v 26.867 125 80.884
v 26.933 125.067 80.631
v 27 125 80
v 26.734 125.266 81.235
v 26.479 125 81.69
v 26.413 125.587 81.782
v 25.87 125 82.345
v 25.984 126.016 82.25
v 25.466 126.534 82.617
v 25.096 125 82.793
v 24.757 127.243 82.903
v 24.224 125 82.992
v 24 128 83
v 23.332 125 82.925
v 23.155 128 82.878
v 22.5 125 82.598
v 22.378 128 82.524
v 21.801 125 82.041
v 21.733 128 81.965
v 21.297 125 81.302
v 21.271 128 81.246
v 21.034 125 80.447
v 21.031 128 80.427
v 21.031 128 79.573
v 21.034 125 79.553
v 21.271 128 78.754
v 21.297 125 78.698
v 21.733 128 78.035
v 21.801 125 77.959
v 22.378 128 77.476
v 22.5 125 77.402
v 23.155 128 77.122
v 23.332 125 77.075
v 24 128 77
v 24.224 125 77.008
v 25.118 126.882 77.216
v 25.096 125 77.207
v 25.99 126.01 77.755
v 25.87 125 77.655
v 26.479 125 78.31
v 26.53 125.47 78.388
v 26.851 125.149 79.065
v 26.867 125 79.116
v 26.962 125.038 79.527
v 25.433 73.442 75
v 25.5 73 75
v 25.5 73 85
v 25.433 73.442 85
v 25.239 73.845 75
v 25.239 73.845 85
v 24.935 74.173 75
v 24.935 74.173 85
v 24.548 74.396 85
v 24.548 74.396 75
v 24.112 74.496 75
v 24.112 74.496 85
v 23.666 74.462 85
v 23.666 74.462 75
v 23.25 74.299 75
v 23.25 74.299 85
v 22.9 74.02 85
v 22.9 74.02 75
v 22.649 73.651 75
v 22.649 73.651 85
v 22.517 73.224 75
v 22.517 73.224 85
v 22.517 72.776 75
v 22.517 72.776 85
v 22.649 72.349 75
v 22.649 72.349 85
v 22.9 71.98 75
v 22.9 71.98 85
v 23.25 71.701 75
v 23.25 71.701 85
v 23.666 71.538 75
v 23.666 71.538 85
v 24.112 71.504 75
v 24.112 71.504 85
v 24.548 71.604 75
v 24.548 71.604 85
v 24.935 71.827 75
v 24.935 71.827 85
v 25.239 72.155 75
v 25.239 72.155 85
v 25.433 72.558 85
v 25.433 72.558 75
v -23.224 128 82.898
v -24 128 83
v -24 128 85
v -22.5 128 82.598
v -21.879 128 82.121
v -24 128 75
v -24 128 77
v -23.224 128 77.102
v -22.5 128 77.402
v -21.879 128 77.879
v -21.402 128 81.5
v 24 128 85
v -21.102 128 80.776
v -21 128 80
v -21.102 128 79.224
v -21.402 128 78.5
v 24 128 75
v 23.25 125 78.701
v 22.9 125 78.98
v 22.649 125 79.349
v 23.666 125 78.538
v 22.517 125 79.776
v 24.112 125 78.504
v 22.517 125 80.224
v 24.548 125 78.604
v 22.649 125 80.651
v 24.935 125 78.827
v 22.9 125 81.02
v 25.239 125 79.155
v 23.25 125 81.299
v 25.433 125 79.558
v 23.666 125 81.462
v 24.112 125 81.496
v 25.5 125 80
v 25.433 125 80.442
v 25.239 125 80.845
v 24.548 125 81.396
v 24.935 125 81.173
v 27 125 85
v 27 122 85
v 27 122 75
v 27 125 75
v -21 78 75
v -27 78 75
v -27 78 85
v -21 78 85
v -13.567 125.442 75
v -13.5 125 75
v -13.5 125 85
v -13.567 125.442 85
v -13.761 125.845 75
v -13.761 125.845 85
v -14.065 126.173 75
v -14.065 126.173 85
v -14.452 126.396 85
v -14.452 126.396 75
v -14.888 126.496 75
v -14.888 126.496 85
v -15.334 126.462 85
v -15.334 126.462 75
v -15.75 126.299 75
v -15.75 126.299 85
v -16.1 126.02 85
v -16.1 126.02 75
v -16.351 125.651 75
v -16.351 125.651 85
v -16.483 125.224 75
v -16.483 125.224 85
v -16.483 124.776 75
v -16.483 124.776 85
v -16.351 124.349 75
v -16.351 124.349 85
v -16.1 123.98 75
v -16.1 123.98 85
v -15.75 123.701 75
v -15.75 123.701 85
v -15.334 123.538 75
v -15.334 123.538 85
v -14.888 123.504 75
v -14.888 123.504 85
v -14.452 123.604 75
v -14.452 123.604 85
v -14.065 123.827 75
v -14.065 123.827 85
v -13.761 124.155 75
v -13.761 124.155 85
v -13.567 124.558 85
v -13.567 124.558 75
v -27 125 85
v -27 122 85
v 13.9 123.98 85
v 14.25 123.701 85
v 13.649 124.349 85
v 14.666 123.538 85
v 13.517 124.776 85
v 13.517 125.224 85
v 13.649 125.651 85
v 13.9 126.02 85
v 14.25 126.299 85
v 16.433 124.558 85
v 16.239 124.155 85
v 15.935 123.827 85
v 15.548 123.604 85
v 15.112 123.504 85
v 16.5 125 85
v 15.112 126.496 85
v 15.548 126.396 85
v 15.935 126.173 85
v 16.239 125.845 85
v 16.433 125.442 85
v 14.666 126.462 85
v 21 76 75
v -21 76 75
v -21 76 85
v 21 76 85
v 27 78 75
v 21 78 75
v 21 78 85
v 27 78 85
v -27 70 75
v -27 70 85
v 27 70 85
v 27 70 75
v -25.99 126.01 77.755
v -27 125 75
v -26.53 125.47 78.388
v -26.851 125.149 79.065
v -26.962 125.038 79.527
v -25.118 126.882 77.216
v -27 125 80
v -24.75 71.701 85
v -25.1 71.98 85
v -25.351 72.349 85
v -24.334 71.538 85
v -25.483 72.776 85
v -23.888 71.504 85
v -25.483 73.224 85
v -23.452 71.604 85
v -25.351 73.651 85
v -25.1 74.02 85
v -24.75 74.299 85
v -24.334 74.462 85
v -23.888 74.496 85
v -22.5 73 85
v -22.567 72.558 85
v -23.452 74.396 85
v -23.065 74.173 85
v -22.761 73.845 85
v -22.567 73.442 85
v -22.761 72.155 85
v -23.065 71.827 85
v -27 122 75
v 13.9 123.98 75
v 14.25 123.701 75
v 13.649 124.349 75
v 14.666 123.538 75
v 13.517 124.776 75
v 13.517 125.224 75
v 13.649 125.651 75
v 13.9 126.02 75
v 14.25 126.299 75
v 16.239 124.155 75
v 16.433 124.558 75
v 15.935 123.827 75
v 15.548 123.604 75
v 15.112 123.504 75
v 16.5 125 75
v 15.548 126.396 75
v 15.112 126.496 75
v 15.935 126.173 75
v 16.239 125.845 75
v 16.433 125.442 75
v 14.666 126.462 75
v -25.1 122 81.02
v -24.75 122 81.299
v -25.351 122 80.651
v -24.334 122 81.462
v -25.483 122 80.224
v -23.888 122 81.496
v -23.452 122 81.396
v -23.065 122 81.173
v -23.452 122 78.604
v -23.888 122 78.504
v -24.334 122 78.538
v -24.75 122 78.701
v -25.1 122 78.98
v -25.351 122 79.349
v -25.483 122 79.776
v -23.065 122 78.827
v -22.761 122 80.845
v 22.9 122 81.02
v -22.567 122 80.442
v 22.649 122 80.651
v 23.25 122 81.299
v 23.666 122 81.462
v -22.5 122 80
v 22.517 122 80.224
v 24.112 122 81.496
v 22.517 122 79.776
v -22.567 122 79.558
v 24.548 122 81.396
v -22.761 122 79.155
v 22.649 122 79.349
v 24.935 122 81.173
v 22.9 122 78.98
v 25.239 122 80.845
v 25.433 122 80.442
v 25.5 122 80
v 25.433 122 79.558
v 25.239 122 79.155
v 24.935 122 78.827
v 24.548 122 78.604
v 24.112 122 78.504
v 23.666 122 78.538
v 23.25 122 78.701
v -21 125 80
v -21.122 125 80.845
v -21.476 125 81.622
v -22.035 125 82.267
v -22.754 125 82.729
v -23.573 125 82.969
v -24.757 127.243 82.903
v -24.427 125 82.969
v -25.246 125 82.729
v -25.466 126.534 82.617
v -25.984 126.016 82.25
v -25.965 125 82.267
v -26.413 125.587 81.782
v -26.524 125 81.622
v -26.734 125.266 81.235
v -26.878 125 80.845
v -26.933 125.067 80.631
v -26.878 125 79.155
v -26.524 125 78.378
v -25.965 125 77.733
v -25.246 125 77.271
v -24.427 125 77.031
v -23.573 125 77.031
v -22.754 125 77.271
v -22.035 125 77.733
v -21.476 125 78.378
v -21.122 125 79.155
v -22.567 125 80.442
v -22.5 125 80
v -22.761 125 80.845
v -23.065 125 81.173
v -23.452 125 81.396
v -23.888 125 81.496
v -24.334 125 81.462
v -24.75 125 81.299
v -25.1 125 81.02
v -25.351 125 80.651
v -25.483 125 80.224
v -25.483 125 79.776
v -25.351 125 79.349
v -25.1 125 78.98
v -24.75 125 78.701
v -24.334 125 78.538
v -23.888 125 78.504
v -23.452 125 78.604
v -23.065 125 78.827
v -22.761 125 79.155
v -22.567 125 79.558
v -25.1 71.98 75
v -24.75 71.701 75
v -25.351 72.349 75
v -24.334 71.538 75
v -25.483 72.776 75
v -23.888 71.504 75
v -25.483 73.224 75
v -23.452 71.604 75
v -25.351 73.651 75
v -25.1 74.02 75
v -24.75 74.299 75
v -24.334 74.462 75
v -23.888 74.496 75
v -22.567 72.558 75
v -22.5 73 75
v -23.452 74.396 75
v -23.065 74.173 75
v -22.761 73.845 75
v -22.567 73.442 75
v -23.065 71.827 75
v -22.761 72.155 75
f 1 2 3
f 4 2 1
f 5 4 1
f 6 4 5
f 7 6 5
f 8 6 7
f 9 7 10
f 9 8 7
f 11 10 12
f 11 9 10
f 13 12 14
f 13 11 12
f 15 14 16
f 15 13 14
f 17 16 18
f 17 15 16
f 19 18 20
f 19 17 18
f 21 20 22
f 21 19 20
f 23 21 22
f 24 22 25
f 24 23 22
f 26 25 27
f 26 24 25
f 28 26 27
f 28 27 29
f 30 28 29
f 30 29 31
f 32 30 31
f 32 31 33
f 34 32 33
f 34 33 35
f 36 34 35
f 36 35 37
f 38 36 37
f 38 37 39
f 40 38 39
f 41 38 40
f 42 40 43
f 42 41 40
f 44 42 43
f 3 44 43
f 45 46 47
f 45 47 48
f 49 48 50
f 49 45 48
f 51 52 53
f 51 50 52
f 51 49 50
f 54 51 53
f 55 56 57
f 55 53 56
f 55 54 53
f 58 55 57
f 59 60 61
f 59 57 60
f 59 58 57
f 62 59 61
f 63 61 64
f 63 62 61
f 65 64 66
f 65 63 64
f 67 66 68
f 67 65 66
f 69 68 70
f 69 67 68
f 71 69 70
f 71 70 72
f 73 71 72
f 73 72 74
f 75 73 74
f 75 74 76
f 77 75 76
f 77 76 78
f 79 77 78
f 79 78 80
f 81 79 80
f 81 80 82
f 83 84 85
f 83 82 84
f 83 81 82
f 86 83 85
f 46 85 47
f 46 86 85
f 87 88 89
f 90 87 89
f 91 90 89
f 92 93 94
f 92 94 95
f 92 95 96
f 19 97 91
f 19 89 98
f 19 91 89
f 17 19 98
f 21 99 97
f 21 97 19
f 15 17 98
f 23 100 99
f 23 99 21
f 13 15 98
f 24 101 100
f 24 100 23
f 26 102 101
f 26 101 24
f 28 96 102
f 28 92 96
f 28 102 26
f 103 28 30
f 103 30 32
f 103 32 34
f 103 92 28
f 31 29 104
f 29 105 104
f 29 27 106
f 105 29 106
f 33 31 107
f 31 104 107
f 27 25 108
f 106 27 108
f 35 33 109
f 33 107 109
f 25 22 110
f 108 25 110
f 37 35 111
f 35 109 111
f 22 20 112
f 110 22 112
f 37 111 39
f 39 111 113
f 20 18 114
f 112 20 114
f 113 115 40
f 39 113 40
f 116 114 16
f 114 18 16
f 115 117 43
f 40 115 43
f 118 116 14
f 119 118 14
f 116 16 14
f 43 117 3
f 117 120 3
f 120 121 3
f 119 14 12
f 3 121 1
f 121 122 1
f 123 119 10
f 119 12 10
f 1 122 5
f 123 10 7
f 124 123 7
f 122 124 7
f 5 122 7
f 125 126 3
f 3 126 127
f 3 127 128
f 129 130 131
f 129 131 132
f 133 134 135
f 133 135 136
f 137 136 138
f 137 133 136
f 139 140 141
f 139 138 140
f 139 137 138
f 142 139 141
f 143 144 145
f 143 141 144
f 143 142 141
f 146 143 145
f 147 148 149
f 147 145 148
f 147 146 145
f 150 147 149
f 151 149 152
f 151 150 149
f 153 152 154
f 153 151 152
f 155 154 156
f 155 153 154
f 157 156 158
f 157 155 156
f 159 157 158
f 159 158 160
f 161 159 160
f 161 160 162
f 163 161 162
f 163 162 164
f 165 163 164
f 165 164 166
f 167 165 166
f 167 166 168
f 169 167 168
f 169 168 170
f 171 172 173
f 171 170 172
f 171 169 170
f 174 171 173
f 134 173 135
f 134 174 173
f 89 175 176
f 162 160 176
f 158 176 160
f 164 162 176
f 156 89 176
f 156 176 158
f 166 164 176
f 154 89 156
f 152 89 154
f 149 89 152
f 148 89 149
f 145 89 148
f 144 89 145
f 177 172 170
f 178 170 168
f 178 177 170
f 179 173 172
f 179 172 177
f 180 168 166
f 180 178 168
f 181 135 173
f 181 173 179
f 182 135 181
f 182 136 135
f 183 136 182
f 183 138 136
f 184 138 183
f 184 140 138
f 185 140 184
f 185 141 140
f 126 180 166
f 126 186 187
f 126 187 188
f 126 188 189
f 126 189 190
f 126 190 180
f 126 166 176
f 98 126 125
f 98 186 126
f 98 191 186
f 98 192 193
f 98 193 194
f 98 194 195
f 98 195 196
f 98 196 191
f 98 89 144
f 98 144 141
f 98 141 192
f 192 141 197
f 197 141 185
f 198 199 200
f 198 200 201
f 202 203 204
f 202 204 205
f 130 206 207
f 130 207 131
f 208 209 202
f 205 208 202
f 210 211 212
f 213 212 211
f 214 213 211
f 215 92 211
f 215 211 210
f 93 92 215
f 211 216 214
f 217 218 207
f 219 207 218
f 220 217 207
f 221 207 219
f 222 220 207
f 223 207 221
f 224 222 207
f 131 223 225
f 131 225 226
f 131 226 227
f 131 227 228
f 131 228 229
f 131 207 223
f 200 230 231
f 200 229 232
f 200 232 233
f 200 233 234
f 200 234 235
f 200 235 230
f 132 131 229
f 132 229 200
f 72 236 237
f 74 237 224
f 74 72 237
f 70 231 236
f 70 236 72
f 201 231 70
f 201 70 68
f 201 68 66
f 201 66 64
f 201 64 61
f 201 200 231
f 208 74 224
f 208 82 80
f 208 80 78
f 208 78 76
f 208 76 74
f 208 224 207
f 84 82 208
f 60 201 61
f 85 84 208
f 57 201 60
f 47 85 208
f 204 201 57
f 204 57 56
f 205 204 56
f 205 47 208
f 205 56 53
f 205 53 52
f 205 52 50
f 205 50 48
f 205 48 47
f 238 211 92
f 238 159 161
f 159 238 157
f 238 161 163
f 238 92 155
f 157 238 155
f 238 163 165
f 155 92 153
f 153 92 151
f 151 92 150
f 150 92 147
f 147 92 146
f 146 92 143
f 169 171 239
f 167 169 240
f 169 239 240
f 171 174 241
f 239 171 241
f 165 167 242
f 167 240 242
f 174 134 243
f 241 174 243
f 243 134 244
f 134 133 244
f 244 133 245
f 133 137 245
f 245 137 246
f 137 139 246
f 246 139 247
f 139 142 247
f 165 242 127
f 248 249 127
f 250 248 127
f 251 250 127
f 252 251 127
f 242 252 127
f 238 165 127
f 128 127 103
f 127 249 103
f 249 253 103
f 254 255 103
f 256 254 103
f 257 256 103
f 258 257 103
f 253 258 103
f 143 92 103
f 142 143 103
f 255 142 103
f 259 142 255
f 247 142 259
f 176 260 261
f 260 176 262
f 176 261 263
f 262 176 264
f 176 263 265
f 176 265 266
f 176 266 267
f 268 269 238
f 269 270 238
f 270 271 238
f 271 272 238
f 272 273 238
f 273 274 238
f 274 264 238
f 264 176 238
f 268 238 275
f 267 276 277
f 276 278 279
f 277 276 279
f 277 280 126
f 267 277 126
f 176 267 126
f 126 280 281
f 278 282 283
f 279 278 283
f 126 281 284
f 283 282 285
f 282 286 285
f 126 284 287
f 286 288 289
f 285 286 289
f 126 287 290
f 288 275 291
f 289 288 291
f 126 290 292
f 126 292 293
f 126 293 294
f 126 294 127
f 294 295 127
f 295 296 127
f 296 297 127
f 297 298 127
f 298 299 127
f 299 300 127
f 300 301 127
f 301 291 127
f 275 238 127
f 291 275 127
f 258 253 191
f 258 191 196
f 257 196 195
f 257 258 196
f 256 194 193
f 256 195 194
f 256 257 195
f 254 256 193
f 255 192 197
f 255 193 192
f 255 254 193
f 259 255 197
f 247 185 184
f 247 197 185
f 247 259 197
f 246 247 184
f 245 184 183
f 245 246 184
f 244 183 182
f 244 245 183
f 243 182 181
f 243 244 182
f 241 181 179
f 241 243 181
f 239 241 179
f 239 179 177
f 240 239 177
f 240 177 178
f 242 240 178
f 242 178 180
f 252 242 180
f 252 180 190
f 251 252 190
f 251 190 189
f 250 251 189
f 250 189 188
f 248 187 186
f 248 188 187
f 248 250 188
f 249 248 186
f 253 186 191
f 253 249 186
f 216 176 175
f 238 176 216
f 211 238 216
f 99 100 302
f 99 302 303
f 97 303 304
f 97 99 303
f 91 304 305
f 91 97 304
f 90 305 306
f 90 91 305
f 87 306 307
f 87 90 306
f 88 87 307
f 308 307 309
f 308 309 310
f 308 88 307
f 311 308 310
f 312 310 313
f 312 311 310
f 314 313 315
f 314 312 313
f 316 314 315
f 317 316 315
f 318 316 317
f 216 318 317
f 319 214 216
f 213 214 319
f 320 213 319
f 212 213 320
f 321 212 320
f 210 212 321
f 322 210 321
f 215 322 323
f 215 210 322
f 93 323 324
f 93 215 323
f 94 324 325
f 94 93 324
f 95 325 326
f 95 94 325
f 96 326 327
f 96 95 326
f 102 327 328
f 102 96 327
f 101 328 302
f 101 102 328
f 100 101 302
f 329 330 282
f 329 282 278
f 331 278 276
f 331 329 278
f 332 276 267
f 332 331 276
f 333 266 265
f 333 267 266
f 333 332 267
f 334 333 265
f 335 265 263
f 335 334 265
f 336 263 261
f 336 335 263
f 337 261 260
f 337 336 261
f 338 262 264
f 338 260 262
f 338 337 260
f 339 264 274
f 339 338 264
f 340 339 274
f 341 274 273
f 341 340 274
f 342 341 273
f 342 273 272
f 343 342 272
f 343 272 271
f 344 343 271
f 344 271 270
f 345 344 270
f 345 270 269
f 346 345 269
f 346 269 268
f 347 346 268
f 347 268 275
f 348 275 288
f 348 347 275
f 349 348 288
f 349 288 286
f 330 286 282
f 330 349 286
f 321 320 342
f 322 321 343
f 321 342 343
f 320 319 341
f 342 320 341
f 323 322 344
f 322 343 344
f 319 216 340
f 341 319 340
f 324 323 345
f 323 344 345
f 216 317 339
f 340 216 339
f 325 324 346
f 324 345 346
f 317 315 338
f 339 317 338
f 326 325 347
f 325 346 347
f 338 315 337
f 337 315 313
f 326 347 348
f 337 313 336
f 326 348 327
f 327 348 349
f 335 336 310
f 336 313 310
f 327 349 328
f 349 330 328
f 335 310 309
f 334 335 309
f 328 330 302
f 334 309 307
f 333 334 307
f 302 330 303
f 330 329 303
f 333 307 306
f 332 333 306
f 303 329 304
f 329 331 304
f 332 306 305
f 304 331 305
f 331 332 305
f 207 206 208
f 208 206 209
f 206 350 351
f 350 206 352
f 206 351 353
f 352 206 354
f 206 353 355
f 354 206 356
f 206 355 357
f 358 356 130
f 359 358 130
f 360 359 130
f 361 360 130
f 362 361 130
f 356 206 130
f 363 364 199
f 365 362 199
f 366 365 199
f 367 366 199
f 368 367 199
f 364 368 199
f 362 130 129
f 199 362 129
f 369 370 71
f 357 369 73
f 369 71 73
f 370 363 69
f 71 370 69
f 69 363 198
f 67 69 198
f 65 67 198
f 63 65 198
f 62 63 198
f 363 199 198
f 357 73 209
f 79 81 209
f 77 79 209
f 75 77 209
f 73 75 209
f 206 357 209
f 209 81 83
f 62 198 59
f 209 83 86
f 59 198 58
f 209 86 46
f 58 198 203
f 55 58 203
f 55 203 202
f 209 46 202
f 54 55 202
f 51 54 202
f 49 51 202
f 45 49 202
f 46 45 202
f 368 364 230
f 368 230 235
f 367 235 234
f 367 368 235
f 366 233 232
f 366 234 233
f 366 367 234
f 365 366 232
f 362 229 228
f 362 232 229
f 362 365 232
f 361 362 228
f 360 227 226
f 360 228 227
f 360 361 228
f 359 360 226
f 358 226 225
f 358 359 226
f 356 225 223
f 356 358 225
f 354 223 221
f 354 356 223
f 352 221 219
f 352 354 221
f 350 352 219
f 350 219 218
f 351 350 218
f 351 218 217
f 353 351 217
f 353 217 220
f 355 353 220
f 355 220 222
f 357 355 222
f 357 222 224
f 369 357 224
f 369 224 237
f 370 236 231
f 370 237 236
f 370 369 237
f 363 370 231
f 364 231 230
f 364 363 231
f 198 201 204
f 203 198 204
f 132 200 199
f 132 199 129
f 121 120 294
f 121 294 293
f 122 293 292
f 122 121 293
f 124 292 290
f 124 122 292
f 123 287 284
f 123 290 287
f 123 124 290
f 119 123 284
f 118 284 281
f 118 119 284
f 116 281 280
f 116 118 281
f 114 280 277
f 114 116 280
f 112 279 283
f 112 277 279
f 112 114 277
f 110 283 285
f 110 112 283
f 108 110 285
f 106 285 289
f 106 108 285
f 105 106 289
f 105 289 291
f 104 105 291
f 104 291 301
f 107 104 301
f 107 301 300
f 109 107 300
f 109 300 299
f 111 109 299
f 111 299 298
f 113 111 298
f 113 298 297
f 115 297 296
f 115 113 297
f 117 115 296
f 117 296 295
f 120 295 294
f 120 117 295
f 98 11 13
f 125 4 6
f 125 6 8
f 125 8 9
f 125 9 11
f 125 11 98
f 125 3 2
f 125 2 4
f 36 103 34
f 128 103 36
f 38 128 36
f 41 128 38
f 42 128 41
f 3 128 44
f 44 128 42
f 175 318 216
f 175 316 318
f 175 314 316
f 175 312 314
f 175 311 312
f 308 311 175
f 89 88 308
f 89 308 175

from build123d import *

# Parameters (mm, degrees)
CYLINDER2809_R     = 1.5
CYLINDER2809_DEPTH = 50
CYLINDER2807_R     = 1.5
CYLINDER2807_DEPTH = 50
CYLINDER2806_R     = 3
CYLINDER2806_DEPTH = 3
CYLINDER2803_R     = 3
CYLINDER2803_DEPTH = 3
CYLINDER2810_R     = 1.5
CYLINDER2810_DEPTH = 60
CYLINDER2805_R     = 1.5
CYLINDER2805_DEPTH = 60
CYLINDER2808_R     = 1.5
CYLINDER2808_DEPTH = 60
CYLINDER2804_R     = 1.5
CYLINDER2804_DEPTH = 60
BOX1004_W          = 56
BOX1004_H          = 44
BOX1004_DEPTH      = 10
BOX1002_W          = 42
BOX1002_H          = 46
BOX1002_DEPTH      = 50
BOX1003_W          = 54
BOX1003_H          = 58
BOX1003_DEPTH      = 10
CHAMFER147_SIZE    = 3


with BuildPart() as v_lec2779:
    # Cylinder2809 → Cylinder2809 (new body)
    with BuildSketch(Plane(origin=(24, 140, 72), x_dir=(1, 0, 0), z_dir=(0, -1, 0))):
        Circle(CYLINDER2809_R)
    extrude(amount=CYLINDER2809_DEPTH)


with BuildPart() as compound1252:
    # Cylinder2807 → Cylinder2807 (new body)
    with BuildSketch(Plane(origin=(-24, 140, 72), x_dir=(1, 0, 0), z_dir=(0, -1, 0))):
        Circle(CYLINDER2807_R)
    extrude(amount=CYLINDER2807_DEPTH)

    # Compound1252: union Válec2779
    add(v_lec2779.part)


with BuildPart() as compound1252_1:
    # Compound1252 placement: moved
    add(compound1252.part.moved(Location((0, 0, 8))))


with BuildPart() as v_lec2776:
    # Cylinder2806 → Cylinder2806 (new body)
    with BuildSketch(Plane(origin=(24, 128, 72), x_dir=(1, 0, 0), z_dir=(0, -1, 0))):
        Circle(CYLINDER2806_R)
    extrude(amount=CYLINDER2806_DEPTH)


with BuildPart() as compound1250:
    # Cylinder2803 → Cylinder2803 (new body)
    with BuildSketch(Plane(origin=(-24, 128, 72), x_dir=(1, 0, 0), z_dir=(0, -1, 0))):
        Circle(CYLINDER2803_R)
    extrude(amount=CYLINDER2803_DEPTH)

    # Compound1250: union Válec2776
    add(v_lec2776.part)


with BuildPart() as compound1250_1:
    # Compound1250 placement: moved
    add(compound1250.part.moved(Location((0, 0, 8))))


with BuildPart() as v_lec2780:
    # Cylinder2810 → Cylinder2810 (new body)
    with BuildSketch(Plane(origin=(-24, 73, -80), x_dir=(1, 0, 0), z_dir=(0, 0, 1))):
        Circle(CYLINDER2810_R)
    extrude(amount=CYLINDER2810_DEPTH)


with BuildPart() as v_lec2775:
    # Cylinder2805 → Cylinder2805 (new body)
    with BuildSketch(Plane(origin=(-15, 125, -80), x_dir=(1, 0, 0), z_dir=(0, 0, 1))):
        Circle(CYLINDER2805_R)
    extrude(amount=CYLINDER2805_DEPTH)


with BuildPart() as v_lec2778:
    # Cylinder2808 → Cylinder2808 (new body)
    with BuildSketch(Plane(origin=(15, 125, -80), x_dir=(1, 0, 0), z_dir=(0, 0, 1))):
        Circle(CYLINDER2808_R)
    extrude(amount=CYLINDER2808_DEPTH)


with BuildPart() as compound1253:
    # Cylinder2804 → Cylinder2804 (new body)
    with BuildSketch(Plane(origin=(24, 73, -80), x_dir=(1, 0, 0), z_dir=(0, 0, 1))):
        Circle(CYLINDER2804_R)
    extrude(amount=CYLINDER2804_DEPTH)

    # Compound1253: union Válec2780, Válec2775, Válec2778
    add(v_lec2780.part)
    add(v_lec2775.part)
    add(v_lec2778.part)


with BuildPart() as compound1253_1:
    # Compound1253 placement: moved
    add(compound1253.part.moved(Location((0, 0, 120))))


with BuildPart() as krychle1003:
    # Box1004 → Box1004 (new body)
    with BuildSketch(Plane(origin=(-28, 78, 75), x_dir=(1, 0, 0), z_dir=(0, 0, 1))):
        with Locations((28, 22)):
            Rectangle(BOX1004_W, BOX1004_H)
    extrude(amount=BOX1004_DEPTH)


with BuildPart() as krychle1001:
    # Box1002 → Box1002 (new body)
    with BuildSketch(Plane(origin=(-21, 76, 38), x_dir=(1, 0, 0), z_dir=(0, 0, 1))):
        with Locations((21, 23)):
            Rectangle(BOX1002_W, BOX1002_H)
    extrude(amount=BOX1002_DEPTH)


with BuildPart() as cut1065:
    # Box1003 → Box1003 (new body)
    with BuildSketch(Plane(origin=(-27, 70, 75), x_dir=(1, 0, 0), z_dir=(0, 0, 1))):
        with Locations((27, 29)):
            Rectangle(BOX1003_W, BOX1003_H)
    extrude(amount=BOX1003_DEPTH)

    # Cut1062: cut Krychle1001
    add(krychle1001.part, mode=Mode.SUBTRACT)

    # Cut1066: cut Krychle1003
    add(krychle1003.part, mode=Mode.SUBTRACT)

    # Cut1067: cut Compound1253
    add(compound1253_1.part, mode=Mode.SUBTRACT)

    # Chamfer147
    chamfer147_edges = [cut1065.edges().sort_by_distance(p)[0] for p in [
        (-27, 128, 80),
        (27, 128, 80),
    ]]
    chamfer(chamfer147_edges, length=CHAMFER147_SIZE)

    # Cut1064: cut Compound1250
    add(compound1250_1.part, mode=Mode.SUBTRACT)

    # Cut1065: cut Compound1252
    add(compound1252_1.part, mode=Mode.SUBTRACT)


solid = cut1065.part
